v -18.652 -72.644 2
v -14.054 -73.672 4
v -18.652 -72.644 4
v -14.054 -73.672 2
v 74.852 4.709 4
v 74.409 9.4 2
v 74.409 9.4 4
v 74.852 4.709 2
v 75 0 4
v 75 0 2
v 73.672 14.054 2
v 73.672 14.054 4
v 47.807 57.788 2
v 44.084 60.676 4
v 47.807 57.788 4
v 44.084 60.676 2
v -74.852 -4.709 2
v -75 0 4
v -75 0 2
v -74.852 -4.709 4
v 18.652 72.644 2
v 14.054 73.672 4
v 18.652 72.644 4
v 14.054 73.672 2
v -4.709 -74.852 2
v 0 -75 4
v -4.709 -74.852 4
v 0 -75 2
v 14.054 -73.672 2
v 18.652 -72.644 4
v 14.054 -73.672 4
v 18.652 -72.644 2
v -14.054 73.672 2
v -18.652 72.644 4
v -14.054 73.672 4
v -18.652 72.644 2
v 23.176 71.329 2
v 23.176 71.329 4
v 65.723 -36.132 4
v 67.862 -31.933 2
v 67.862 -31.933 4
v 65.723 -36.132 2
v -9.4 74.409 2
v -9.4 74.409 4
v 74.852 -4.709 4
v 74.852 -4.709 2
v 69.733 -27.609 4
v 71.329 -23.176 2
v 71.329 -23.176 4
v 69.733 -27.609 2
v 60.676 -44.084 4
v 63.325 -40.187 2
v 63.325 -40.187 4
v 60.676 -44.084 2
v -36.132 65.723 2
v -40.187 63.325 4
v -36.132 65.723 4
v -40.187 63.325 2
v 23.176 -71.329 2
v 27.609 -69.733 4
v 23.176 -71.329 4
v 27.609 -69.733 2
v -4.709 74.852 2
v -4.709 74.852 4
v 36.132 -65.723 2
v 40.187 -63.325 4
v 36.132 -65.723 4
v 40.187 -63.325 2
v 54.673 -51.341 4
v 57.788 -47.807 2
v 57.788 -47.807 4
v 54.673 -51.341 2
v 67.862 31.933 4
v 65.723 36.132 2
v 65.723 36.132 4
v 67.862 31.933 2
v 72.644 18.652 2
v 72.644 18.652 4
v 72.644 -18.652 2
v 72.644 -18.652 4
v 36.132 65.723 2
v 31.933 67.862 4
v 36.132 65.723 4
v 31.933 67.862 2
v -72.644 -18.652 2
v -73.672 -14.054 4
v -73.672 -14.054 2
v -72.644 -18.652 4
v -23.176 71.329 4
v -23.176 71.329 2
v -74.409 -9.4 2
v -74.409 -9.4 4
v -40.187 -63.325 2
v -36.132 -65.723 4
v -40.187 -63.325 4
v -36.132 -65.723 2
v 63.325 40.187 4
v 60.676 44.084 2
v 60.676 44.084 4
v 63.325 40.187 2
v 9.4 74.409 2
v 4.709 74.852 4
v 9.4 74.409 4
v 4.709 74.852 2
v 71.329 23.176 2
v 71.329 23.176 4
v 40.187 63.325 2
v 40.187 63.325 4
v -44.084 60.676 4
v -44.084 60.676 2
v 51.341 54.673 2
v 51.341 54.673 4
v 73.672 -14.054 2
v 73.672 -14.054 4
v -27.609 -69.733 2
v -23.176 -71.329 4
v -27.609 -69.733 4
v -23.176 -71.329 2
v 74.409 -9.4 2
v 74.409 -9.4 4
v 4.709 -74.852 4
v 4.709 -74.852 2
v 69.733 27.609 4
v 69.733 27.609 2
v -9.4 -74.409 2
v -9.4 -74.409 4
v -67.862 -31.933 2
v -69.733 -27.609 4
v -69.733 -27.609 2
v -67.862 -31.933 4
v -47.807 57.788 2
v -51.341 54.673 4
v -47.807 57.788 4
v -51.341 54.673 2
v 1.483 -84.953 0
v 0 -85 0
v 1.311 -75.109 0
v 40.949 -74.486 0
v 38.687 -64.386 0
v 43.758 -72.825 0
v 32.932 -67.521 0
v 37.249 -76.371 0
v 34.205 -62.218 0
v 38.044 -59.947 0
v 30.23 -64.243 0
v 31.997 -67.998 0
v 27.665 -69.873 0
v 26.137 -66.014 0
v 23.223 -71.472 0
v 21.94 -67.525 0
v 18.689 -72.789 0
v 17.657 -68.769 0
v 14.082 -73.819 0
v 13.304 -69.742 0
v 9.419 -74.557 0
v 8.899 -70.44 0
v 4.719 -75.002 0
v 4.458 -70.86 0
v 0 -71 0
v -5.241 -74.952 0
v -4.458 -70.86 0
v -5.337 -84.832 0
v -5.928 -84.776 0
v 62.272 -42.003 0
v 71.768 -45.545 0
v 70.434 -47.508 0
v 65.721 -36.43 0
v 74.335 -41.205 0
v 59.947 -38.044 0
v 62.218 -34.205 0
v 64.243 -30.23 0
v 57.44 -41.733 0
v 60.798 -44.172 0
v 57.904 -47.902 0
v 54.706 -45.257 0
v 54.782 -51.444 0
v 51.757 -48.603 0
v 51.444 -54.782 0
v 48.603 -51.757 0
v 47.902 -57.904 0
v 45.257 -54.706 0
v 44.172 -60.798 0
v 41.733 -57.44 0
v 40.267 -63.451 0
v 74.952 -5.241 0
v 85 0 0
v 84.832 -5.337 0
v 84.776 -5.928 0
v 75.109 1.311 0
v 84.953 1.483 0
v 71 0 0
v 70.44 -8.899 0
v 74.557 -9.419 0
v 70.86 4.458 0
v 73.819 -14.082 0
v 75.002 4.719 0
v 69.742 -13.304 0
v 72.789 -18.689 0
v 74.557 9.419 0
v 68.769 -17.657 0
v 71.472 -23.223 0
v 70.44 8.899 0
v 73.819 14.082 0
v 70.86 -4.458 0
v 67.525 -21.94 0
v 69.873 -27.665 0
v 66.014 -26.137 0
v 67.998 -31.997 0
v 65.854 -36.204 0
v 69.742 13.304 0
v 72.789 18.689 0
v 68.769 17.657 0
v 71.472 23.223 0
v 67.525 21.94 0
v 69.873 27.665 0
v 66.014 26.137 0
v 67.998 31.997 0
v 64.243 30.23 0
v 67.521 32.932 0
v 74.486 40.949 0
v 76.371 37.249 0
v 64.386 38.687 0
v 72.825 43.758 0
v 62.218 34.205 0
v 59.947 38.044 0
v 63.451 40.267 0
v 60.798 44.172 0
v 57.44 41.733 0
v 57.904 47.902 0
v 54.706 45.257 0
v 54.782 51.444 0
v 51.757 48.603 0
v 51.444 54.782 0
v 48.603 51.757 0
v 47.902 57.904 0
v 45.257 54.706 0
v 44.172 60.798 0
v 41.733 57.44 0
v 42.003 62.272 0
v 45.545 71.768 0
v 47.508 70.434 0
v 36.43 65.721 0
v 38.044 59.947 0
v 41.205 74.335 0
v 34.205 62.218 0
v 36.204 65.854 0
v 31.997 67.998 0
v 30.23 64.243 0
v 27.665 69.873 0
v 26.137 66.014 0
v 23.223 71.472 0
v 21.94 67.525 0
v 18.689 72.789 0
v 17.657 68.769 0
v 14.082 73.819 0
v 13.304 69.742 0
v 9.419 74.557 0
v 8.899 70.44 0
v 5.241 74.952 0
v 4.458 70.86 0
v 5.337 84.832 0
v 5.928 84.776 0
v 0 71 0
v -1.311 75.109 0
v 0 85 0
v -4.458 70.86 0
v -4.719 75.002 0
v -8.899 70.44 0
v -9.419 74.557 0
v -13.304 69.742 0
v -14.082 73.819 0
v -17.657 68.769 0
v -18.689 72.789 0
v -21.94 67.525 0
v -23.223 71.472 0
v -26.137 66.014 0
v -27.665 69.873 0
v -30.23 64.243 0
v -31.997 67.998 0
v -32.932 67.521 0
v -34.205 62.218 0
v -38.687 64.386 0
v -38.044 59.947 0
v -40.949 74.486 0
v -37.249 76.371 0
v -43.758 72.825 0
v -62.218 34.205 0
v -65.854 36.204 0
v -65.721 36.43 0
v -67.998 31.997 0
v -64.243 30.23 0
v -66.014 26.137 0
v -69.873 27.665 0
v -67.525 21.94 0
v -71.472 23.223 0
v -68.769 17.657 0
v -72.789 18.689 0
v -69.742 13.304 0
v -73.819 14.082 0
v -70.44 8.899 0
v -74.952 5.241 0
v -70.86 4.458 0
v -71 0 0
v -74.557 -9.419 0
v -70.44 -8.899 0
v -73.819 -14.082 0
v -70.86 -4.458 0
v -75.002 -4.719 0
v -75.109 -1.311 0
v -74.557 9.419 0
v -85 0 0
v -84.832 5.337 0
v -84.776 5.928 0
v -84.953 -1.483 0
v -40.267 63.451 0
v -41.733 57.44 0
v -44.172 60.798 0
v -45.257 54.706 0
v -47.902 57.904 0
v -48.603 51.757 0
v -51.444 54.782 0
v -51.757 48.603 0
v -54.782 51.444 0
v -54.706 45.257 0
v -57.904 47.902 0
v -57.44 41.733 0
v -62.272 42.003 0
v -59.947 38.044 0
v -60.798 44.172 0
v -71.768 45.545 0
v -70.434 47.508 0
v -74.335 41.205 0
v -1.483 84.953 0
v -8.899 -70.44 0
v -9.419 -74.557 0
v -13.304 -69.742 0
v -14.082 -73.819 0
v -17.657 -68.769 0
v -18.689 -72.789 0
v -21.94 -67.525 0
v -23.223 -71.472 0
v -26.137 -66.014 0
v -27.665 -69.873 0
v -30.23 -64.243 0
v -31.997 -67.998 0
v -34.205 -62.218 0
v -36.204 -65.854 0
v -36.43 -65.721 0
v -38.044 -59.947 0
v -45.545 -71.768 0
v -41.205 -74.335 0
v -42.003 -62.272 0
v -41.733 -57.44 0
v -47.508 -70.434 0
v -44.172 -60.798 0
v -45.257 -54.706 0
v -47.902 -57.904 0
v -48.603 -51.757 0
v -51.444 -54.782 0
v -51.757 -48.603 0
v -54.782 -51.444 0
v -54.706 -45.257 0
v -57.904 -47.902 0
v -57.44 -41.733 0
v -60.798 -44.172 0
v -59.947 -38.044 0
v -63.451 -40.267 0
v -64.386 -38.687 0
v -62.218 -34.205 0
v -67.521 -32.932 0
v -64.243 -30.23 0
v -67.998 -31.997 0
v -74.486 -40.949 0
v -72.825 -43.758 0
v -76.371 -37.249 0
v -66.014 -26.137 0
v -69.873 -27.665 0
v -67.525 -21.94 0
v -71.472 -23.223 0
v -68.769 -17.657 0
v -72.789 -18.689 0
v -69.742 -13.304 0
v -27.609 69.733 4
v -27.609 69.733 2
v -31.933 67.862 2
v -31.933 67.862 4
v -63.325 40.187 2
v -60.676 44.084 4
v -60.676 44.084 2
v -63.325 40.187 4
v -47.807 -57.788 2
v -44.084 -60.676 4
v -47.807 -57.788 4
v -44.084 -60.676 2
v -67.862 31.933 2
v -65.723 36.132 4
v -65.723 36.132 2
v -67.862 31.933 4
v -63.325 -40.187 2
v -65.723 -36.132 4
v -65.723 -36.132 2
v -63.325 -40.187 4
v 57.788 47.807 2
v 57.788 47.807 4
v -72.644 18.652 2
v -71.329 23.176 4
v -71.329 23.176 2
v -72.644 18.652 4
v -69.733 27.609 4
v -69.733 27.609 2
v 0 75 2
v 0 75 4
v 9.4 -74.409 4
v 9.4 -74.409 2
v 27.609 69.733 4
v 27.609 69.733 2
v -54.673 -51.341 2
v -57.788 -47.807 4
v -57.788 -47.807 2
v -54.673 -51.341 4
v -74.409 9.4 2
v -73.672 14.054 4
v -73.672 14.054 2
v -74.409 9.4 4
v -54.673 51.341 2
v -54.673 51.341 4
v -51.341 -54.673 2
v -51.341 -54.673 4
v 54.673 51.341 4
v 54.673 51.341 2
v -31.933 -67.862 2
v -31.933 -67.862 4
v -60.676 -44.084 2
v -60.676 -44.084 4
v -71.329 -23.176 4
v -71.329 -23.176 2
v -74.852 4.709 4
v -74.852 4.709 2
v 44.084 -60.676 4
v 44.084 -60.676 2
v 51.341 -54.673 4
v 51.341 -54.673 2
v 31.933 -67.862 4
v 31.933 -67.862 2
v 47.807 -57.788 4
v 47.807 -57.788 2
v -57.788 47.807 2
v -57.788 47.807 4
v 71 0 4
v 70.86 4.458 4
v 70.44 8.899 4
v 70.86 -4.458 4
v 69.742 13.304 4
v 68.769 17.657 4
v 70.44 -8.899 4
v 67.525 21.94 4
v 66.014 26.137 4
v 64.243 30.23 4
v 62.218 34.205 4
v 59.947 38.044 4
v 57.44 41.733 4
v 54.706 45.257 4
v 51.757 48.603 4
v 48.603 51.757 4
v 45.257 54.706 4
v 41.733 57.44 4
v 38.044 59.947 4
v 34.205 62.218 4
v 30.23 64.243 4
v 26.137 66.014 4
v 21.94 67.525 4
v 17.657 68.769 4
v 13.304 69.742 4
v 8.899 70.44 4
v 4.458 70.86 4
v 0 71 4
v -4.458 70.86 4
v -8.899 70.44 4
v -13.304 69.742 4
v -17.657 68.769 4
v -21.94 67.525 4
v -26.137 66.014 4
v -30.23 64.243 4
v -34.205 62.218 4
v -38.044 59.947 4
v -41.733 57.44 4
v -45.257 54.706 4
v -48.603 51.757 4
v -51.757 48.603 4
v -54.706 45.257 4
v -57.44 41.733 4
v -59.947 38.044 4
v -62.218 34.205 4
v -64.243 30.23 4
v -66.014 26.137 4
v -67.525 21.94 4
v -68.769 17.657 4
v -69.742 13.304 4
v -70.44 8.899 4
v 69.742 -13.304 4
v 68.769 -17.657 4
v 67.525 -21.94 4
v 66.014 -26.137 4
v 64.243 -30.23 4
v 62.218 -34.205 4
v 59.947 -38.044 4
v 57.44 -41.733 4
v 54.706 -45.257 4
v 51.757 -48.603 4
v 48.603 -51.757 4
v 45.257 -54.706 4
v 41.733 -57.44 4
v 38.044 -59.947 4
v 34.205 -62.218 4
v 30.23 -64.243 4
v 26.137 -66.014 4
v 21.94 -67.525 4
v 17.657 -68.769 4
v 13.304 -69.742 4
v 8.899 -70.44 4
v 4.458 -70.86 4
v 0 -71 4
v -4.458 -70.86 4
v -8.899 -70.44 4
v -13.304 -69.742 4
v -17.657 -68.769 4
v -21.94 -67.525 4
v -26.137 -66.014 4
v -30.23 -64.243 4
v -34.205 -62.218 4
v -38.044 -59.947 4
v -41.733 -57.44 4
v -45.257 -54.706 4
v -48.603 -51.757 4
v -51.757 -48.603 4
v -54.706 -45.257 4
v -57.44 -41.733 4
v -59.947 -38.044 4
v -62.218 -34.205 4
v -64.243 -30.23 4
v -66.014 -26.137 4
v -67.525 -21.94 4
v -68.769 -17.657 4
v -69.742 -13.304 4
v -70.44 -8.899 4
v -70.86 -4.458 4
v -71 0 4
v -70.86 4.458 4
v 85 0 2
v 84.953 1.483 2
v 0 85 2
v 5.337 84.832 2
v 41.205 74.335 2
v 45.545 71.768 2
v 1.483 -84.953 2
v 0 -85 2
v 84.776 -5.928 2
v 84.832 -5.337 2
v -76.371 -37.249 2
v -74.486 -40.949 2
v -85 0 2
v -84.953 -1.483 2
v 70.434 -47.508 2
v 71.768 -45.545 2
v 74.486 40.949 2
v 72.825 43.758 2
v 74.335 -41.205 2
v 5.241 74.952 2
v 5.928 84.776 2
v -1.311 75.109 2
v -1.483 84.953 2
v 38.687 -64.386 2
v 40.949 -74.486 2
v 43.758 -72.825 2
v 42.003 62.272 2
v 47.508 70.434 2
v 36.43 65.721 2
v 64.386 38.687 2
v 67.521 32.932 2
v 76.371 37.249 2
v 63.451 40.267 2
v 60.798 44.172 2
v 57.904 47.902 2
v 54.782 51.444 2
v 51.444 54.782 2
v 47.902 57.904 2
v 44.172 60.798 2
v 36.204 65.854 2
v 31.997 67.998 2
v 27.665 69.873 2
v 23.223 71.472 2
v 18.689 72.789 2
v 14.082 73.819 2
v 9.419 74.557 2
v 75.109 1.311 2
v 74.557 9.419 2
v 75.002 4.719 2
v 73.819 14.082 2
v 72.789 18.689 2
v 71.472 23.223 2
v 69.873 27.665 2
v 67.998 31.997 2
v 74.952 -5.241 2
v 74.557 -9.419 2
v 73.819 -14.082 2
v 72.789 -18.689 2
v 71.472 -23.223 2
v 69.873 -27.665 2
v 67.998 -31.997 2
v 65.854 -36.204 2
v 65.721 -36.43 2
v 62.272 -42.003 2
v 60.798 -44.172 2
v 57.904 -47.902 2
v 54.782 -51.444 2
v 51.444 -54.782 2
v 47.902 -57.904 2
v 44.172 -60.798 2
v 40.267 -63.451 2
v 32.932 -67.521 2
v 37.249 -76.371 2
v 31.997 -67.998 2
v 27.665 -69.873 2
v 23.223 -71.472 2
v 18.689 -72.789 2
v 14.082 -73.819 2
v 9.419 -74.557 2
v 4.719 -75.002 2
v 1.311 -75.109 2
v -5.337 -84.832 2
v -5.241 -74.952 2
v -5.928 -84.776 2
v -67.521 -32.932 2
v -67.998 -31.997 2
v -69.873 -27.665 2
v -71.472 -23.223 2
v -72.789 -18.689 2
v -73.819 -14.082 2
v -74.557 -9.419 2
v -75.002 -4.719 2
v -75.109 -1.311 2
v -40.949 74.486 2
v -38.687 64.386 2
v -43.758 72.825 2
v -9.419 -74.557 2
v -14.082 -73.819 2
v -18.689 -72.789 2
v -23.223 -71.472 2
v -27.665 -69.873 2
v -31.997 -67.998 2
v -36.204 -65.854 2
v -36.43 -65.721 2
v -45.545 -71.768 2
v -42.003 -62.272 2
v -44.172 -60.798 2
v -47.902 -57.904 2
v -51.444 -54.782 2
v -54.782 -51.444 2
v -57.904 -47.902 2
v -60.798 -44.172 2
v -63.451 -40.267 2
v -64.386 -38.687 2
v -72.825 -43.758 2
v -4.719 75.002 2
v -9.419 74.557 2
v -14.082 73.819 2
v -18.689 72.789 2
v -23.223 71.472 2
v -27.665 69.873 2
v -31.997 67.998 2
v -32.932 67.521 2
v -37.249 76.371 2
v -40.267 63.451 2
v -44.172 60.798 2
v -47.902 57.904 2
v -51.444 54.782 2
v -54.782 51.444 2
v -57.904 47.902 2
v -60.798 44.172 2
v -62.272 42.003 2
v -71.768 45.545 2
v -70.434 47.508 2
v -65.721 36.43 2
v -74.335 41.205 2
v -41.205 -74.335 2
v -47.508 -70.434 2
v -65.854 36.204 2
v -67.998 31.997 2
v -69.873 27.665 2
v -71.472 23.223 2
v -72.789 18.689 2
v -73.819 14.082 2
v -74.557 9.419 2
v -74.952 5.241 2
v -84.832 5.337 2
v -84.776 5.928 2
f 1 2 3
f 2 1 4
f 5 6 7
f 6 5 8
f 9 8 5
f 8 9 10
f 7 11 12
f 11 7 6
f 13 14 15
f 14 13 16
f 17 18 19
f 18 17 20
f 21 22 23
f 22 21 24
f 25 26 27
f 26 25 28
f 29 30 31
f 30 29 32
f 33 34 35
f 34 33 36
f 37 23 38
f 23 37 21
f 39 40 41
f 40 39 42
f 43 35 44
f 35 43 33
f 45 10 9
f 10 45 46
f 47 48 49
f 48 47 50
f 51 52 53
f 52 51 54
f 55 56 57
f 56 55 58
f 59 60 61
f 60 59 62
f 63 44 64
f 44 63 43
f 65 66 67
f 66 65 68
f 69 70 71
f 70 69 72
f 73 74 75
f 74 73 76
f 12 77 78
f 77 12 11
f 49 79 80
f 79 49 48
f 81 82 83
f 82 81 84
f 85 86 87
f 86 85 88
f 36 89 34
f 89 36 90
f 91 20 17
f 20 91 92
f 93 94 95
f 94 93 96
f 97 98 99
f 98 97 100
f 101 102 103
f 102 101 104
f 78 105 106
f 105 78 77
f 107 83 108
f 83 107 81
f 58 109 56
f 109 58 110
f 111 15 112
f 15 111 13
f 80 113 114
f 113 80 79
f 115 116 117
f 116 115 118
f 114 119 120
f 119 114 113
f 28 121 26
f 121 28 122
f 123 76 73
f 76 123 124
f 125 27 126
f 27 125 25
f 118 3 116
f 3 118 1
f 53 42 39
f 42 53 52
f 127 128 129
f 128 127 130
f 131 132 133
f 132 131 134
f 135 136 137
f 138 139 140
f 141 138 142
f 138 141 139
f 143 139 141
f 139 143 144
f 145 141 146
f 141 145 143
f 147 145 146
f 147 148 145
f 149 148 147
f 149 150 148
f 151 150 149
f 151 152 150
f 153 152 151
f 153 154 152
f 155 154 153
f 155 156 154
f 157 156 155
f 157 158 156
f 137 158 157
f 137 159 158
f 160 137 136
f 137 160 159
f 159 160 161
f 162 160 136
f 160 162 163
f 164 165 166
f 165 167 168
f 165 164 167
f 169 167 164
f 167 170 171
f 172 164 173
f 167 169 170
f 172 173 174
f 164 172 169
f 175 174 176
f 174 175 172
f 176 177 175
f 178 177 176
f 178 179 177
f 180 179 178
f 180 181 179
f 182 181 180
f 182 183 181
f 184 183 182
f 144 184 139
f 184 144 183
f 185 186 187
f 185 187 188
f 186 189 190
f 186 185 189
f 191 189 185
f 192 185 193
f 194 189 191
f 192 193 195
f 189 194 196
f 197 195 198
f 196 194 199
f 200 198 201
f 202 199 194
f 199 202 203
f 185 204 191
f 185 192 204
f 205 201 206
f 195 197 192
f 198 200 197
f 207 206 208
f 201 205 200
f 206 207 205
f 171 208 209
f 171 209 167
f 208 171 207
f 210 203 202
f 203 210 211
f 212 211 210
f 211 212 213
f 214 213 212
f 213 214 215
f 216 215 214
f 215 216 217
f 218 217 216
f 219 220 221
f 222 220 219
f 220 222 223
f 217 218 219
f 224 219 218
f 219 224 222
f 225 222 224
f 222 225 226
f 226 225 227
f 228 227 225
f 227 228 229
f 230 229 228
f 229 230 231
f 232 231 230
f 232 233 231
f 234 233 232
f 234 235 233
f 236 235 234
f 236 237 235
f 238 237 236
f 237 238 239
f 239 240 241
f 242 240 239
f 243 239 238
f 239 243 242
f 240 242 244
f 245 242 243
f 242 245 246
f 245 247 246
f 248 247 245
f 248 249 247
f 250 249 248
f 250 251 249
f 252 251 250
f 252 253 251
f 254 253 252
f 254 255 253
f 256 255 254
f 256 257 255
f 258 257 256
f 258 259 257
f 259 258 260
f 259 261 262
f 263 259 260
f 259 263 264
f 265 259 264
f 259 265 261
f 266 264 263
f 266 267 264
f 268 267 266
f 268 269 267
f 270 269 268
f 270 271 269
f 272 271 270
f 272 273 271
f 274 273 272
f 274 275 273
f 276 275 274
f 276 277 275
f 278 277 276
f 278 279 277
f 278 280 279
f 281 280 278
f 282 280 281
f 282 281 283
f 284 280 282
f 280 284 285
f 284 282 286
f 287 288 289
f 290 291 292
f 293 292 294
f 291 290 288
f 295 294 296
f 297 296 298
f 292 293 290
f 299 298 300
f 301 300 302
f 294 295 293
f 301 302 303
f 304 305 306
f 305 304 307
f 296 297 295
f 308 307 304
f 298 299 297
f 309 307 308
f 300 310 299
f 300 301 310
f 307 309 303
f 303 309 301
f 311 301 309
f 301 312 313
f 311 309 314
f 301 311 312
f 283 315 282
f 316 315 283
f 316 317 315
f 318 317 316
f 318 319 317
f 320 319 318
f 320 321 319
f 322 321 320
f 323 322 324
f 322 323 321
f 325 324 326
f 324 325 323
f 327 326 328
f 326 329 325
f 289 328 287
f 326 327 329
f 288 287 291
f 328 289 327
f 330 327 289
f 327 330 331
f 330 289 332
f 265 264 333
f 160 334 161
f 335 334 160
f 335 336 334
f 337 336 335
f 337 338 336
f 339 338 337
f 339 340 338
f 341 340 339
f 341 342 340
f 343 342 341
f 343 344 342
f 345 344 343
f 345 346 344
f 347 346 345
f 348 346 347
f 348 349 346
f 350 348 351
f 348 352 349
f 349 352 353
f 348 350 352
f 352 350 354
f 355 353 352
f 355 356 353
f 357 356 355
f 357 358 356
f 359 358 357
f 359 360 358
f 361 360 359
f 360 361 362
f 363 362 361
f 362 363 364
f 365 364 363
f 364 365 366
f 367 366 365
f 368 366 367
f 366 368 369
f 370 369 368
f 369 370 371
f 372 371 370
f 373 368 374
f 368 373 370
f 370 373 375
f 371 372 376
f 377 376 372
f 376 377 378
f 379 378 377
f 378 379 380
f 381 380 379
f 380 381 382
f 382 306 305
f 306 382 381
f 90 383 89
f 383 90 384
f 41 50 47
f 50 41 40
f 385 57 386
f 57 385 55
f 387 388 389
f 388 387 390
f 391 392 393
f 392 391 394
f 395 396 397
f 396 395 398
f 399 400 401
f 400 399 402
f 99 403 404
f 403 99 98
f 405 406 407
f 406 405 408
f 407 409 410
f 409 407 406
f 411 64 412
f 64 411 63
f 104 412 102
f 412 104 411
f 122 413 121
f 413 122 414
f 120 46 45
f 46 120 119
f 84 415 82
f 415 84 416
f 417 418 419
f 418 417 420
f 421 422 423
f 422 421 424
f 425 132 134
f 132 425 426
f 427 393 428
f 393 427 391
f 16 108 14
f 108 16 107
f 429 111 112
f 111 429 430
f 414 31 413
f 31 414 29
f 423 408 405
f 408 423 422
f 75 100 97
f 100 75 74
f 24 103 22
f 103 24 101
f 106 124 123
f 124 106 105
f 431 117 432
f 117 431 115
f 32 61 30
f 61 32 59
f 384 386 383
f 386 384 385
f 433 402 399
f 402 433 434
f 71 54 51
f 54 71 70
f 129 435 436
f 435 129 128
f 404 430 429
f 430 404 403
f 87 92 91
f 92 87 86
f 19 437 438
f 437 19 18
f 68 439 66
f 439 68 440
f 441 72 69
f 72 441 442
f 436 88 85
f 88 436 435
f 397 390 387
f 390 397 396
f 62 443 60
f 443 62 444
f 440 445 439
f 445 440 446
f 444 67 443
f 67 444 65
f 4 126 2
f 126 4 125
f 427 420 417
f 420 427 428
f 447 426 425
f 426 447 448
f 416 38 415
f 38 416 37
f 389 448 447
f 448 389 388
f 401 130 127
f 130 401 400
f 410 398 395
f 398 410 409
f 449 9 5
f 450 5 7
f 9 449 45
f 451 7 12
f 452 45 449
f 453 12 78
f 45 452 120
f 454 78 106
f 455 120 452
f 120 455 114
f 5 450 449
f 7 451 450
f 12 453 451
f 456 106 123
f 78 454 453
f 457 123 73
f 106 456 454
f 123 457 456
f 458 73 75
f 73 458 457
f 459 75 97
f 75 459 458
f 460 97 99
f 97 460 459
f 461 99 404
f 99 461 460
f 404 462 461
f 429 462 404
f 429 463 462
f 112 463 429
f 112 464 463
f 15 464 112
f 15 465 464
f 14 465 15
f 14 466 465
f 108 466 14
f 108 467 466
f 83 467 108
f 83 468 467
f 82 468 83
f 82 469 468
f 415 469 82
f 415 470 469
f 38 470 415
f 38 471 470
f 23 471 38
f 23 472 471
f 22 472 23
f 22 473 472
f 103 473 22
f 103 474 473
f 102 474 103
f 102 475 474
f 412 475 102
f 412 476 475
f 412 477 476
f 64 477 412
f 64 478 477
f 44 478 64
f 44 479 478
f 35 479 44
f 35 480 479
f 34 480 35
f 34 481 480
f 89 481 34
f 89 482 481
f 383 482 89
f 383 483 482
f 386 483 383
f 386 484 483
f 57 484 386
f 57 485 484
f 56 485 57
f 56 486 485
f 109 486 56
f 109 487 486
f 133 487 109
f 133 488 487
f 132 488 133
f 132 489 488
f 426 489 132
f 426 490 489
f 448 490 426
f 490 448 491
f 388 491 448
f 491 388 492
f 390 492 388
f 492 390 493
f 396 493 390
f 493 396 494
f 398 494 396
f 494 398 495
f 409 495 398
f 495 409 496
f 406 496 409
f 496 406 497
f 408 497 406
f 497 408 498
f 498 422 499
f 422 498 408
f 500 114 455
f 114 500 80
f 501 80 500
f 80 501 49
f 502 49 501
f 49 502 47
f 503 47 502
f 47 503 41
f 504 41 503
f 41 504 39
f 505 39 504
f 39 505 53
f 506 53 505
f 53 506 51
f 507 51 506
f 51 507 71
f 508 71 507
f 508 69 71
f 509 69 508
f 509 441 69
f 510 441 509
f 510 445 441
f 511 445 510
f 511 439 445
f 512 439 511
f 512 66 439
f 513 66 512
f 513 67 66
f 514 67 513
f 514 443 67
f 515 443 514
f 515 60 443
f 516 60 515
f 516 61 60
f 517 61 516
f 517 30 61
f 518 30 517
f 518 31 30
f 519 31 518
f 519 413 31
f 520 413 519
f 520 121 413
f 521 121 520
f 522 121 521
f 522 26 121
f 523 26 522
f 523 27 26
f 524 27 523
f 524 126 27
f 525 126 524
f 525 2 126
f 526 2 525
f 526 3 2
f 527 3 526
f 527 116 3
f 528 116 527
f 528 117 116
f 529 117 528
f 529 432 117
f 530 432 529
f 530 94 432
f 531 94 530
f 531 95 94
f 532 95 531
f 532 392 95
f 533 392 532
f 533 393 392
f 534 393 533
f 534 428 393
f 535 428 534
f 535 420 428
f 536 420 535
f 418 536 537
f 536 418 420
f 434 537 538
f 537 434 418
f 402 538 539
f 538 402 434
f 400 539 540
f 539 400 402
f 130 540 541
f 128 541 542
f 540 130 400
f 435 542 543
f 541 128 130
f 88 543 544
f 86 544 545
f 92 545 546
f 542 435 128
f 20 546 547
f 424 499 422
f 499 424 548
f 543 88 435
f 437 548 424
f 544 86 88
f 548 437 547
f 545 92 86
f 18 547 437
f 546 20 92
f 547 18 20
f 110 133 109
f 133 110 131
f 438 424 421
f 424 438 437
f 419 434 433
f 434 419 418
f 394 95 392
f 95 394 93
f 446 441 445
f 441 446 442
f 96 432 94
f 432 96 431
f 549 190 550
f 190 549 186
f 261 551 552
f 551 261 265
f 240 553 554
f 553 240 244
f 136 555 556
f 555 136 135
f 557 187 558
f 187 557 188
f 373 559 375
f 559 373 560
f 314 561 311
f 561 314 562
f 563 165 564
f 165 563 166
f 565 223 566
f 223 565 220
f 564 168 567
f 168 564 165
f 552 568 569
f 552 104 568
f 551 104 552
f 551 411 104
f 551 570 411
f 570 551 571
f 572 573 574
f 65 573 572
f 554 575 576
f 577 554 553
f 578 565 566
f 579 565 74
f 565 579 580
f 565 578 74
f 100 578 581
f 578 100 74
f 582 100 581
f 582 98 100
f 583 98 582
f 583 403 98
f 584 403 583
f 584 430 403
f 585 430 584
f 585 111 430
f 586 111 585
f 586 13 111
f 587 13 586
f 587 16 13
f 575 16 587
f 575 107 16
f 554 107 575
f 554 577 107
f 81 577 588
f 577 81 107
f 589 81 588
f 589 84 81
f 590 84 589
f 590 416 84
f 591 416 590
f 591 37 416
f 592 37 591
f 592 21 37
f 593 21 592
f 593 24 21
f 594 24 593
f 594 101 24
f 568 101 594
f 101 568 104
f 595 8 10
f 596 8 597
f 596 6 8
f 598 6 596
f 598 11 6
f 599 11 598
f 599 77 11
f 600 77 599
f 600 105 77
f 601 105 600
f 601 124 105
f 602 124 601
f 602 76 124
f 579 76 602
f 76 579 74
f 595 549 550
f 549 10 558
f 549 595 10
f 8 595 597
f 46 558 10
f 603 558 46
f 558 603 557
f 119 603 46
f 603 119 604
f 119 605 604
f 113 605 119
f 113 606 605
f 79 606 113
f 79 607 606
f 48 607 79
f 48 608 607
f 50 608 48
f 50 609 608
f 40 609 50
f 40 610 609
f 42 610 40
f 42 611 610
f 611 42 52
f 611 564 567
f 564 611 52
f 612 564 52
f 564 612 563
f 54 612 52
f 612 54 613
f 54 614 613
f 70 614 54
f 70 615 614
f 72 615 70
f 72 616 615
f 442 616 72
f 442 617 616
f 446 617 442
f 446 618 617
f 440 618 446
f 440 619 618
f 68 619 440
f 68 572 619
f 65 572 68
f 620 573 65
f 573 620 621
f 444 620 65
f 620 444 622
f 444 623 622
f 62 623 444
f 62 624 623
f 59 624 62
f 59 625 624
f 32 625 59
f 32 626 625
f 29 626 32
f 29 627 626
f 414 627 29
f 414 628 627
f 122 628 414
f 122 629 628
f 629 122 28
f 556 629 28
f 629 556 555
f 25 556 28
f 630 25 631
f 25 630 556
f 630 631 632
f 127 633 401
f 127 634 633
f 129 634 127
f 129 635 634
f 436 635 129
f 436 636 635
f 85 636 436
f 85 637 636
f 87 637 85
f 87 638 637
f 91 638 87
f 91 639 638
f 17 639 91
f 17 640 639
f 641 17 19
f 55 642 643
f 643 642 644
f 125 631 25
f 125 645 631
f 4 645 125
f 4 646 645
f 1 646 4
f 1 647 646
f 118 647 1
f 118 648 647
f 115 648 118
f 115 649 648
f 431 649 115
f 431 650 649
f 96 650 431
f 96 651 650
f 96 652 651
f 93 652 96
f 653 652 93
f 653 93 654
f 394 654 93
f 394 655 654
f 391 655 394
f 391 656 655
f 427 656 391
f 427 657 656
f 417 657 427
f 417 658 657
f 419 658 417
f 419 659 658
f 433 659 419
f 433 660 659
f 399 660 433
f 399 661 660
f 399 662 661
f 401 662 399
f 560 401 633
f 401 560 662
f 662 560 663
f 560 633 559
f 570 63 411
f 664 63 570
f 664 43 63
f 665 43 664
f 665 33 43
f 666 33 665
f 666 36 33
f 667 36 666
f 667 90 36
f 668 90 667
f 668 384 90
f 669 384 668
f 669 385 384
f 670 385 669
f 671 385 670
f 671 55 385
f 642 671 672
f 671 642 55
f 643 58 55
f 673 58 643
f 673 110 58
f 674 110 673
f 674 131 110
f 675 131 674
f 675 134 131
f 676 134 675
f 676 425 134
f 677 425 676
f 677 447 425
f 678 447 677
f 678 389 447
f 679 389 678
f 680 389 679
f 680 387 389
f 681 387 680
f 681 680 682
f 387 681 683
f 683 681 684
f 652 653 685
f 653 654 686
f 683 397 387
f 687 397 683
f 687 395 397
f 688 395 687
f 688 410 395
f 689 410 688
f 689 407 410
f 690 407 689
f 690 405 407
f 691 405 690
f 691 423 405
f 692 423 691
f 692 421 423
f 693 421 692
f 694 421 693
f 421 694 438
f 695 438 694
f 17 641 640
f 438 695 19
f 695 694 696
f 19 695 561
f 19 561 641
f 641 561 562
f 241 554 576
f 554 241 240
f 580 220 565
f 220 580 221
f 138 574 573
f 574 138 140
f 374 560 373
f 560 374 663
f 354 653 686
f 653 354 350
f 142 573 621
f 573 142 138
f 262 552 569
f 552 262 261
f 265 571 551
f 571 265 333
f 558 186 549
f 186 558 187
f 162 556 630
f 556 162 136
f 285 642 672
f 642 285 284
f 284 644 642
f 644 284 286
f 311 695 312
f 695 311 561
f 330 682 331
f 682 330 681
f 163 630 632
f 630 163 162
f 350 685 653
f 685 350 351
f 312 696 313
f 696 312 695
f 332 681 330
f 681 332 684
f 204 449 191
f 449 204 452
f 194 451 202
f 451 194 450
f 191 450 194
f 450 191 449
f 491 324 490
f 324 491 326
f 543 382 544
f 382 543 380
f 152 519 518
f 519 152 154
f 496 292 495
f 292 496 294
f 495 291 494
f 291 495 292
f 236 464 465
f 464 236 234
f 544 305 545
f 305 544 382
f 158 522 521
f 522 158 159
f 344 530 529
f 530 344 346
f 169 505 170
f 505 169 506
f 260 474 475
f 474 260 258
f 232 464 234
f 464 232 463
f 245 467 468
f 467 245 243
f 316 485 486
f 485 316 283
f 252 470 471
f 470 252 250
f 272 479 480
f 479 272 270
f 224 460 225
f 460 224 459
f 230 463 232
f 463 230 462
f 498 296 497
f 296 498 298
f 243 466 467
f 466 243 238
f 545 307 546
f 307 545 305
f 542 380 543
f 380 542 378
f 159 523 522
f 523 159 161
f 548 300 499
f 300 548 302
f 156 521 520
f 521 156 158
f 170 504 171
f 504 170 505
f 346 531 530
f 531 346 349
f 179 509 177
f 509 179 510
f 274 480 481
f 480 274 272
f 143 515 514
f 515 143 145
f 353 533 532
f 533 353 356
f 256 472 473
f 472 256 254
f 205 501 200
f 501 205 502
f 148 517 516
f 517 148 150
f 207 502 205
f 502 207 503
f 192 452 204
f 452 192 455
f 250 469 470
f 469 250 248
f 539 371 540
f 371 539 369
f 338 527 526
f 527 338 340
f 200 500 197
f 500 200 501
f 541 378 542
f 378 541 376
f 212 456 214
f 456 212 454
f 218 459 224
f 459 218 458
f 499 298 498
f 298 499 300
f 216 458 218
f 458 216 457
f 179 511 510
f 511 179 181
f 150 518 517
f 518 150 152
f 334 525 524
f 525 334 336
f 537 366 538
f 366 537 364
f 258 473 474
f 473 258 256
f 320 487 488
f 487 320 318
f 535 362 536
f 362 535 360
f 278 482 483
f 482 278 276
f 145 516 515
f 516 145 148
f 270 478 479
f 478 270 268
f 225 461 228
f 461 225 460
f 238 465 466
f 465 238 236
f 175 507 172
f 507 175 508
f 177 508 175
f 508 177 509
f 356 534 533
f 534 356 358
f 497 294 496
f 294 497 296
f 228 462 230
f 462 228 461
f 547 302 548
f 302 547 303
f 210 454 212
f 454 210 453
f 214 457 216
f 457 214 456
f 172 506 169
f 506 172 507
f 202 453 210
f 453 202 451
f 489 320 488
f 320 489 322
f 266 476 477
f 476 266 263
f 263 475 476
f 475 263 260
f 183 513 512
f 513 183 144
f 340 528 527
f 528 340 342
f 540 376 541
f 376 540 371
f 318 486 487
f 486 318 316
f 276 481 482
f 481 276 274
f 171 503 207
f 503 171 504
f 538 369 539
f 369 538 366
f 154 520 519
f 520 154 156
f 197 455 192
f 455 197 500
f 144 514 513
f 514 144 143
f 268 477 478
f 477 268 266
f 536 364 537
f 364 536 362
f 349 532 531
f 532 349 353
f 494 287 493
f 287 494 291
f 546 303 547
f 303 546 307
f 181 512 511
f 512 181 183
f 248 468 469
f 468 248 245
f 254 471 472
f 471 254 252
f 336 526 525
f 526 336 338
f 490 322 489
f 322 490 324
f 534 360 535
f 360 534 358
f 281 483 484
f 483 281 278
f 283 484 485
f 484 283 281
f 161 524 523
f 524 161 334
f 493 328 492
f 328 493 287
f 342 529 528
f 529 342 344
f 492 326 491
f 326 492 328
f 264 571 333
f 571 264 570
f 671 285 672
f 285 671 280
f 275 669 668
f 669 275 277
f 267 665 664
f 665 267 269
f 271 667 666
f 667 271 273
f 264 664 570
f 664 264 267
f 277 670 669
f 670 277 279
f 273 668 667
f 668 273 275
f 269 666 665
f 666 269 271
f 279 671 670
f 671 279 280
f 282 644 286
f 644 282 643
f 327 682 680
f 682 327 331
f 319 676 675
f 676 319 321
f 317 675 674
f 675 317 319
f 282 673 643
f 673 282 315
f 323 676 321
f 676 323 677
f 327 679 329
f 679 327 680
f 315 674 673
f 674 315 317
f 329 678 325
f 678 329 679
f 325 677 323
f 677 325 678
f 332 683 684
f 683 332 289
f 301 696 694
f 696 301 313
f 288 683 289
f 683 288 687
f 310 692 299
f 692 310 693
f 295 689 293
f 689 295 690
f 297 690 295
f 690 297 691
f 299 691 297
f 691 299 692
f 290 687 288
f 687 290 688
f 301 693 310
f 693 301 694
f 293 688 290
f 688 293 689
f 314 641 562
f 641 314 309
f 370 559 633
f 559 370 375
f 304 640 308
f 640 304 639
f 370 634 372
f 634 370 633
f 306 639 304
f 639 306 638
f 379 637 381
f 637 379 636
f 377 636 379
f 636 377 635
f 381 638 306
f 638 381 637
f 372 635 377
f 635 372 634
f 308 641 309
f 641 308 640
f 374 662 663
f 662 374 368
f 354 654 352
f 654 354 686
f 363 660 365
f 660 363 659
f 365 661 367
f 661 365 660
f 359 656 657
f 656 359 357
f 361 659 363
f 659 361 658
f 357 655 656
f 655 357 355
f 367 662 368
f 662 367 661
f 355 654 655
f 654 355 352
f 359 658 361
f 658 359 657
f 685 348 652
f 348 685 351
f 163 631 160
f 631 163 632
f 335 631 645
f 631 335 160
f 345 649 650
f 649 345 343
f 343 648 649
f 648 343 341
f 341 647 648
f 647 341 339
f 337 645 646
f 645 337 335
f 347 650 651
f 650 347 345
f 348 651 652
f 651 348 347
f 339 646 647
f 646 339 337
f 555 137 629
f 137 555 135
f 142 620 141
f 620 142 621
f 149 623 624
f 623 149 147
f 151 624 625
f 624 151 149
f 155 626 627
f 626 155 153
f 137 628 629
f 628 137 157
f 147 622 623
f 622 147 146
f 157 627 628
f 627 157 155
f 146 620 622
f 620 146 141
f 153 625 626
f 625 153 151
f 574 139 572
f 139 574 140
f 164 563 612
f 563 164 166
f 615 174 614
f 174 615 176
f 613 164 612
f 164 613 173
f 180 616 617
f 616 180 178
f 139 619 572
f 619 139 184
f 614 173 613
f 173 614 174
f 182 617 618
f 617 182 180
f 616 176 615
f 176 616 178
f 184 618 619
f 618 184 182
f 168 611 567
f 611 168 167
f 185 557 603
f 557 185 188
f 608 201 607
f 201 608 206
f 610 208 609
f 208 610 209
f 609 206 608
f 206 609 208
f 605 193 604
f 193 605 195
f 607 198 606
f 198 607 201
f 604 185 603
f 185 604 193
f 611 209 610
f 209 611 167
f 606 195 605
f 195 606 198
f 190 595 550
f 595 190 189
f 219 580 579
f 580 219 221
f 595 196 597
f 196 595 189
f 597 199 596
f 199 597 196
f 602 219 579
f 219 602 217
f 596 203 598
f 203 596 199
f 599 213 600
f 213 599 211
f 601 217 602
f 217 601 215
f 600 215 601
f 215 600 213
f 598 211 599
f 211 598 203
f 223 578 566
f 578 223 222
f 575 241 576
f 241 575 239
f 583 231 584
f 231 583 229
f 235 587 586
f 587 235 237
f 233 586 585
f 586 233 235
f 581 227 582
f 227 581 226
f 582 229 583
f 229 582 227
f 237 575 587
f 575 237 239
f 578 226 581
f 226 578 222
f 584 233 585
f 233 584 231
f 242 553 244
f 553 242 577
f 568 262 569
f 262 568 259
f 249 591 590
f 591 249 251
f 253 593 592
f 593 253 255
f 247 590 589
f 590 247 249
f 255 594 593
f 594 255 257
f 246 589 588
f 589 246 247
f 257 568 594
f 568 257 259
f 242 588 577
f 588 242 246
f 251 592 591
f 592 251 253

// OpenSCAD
// file: wedge.scad
module wedge(height, radius, angle) {
  intersection() {
    difference() {
      cylinder(r=radius, h=height, $fn=100);
      translate([0,-radius,-1])
        cube([radius,radius*2,height+2]);
    }
    rotate([0,0,angle])
      translate([0,-radius,-1])
        cube([radius,radius*2,height+2]);
  }
}

wedge(height=10, radius=5, angle=15);
// file: shared.scad
use <wedge.scad>;

coil_radius = 75;
coil_length = 2;
slot_depth = 10;
// main file
include <shared.scad>;

module bobbin_left() {
  difference() {
    difference() {
      difference() {
        union() {
          cylinder(h=4, r=coil_radius, $fn=100);
          cylinder(h=2, r=coil_radius+slot_depth, $fn=100);
        }
        translate([0,0,-1])
          cylinder(h=6, r=coil_radius-4, $fn=100);
      }
      for(x=[0:30:360])
        render() difference() {
          rotate([0,0,x+1]) translate([0,0,-1])  wedge(6, coil_radius+slot_depth+1, 25);
          translate([0,0,-2]) cylinder(h=10, r=coil_radius+0.15, $fn=100);
        }
    }
  }
}

bobbin_left();
